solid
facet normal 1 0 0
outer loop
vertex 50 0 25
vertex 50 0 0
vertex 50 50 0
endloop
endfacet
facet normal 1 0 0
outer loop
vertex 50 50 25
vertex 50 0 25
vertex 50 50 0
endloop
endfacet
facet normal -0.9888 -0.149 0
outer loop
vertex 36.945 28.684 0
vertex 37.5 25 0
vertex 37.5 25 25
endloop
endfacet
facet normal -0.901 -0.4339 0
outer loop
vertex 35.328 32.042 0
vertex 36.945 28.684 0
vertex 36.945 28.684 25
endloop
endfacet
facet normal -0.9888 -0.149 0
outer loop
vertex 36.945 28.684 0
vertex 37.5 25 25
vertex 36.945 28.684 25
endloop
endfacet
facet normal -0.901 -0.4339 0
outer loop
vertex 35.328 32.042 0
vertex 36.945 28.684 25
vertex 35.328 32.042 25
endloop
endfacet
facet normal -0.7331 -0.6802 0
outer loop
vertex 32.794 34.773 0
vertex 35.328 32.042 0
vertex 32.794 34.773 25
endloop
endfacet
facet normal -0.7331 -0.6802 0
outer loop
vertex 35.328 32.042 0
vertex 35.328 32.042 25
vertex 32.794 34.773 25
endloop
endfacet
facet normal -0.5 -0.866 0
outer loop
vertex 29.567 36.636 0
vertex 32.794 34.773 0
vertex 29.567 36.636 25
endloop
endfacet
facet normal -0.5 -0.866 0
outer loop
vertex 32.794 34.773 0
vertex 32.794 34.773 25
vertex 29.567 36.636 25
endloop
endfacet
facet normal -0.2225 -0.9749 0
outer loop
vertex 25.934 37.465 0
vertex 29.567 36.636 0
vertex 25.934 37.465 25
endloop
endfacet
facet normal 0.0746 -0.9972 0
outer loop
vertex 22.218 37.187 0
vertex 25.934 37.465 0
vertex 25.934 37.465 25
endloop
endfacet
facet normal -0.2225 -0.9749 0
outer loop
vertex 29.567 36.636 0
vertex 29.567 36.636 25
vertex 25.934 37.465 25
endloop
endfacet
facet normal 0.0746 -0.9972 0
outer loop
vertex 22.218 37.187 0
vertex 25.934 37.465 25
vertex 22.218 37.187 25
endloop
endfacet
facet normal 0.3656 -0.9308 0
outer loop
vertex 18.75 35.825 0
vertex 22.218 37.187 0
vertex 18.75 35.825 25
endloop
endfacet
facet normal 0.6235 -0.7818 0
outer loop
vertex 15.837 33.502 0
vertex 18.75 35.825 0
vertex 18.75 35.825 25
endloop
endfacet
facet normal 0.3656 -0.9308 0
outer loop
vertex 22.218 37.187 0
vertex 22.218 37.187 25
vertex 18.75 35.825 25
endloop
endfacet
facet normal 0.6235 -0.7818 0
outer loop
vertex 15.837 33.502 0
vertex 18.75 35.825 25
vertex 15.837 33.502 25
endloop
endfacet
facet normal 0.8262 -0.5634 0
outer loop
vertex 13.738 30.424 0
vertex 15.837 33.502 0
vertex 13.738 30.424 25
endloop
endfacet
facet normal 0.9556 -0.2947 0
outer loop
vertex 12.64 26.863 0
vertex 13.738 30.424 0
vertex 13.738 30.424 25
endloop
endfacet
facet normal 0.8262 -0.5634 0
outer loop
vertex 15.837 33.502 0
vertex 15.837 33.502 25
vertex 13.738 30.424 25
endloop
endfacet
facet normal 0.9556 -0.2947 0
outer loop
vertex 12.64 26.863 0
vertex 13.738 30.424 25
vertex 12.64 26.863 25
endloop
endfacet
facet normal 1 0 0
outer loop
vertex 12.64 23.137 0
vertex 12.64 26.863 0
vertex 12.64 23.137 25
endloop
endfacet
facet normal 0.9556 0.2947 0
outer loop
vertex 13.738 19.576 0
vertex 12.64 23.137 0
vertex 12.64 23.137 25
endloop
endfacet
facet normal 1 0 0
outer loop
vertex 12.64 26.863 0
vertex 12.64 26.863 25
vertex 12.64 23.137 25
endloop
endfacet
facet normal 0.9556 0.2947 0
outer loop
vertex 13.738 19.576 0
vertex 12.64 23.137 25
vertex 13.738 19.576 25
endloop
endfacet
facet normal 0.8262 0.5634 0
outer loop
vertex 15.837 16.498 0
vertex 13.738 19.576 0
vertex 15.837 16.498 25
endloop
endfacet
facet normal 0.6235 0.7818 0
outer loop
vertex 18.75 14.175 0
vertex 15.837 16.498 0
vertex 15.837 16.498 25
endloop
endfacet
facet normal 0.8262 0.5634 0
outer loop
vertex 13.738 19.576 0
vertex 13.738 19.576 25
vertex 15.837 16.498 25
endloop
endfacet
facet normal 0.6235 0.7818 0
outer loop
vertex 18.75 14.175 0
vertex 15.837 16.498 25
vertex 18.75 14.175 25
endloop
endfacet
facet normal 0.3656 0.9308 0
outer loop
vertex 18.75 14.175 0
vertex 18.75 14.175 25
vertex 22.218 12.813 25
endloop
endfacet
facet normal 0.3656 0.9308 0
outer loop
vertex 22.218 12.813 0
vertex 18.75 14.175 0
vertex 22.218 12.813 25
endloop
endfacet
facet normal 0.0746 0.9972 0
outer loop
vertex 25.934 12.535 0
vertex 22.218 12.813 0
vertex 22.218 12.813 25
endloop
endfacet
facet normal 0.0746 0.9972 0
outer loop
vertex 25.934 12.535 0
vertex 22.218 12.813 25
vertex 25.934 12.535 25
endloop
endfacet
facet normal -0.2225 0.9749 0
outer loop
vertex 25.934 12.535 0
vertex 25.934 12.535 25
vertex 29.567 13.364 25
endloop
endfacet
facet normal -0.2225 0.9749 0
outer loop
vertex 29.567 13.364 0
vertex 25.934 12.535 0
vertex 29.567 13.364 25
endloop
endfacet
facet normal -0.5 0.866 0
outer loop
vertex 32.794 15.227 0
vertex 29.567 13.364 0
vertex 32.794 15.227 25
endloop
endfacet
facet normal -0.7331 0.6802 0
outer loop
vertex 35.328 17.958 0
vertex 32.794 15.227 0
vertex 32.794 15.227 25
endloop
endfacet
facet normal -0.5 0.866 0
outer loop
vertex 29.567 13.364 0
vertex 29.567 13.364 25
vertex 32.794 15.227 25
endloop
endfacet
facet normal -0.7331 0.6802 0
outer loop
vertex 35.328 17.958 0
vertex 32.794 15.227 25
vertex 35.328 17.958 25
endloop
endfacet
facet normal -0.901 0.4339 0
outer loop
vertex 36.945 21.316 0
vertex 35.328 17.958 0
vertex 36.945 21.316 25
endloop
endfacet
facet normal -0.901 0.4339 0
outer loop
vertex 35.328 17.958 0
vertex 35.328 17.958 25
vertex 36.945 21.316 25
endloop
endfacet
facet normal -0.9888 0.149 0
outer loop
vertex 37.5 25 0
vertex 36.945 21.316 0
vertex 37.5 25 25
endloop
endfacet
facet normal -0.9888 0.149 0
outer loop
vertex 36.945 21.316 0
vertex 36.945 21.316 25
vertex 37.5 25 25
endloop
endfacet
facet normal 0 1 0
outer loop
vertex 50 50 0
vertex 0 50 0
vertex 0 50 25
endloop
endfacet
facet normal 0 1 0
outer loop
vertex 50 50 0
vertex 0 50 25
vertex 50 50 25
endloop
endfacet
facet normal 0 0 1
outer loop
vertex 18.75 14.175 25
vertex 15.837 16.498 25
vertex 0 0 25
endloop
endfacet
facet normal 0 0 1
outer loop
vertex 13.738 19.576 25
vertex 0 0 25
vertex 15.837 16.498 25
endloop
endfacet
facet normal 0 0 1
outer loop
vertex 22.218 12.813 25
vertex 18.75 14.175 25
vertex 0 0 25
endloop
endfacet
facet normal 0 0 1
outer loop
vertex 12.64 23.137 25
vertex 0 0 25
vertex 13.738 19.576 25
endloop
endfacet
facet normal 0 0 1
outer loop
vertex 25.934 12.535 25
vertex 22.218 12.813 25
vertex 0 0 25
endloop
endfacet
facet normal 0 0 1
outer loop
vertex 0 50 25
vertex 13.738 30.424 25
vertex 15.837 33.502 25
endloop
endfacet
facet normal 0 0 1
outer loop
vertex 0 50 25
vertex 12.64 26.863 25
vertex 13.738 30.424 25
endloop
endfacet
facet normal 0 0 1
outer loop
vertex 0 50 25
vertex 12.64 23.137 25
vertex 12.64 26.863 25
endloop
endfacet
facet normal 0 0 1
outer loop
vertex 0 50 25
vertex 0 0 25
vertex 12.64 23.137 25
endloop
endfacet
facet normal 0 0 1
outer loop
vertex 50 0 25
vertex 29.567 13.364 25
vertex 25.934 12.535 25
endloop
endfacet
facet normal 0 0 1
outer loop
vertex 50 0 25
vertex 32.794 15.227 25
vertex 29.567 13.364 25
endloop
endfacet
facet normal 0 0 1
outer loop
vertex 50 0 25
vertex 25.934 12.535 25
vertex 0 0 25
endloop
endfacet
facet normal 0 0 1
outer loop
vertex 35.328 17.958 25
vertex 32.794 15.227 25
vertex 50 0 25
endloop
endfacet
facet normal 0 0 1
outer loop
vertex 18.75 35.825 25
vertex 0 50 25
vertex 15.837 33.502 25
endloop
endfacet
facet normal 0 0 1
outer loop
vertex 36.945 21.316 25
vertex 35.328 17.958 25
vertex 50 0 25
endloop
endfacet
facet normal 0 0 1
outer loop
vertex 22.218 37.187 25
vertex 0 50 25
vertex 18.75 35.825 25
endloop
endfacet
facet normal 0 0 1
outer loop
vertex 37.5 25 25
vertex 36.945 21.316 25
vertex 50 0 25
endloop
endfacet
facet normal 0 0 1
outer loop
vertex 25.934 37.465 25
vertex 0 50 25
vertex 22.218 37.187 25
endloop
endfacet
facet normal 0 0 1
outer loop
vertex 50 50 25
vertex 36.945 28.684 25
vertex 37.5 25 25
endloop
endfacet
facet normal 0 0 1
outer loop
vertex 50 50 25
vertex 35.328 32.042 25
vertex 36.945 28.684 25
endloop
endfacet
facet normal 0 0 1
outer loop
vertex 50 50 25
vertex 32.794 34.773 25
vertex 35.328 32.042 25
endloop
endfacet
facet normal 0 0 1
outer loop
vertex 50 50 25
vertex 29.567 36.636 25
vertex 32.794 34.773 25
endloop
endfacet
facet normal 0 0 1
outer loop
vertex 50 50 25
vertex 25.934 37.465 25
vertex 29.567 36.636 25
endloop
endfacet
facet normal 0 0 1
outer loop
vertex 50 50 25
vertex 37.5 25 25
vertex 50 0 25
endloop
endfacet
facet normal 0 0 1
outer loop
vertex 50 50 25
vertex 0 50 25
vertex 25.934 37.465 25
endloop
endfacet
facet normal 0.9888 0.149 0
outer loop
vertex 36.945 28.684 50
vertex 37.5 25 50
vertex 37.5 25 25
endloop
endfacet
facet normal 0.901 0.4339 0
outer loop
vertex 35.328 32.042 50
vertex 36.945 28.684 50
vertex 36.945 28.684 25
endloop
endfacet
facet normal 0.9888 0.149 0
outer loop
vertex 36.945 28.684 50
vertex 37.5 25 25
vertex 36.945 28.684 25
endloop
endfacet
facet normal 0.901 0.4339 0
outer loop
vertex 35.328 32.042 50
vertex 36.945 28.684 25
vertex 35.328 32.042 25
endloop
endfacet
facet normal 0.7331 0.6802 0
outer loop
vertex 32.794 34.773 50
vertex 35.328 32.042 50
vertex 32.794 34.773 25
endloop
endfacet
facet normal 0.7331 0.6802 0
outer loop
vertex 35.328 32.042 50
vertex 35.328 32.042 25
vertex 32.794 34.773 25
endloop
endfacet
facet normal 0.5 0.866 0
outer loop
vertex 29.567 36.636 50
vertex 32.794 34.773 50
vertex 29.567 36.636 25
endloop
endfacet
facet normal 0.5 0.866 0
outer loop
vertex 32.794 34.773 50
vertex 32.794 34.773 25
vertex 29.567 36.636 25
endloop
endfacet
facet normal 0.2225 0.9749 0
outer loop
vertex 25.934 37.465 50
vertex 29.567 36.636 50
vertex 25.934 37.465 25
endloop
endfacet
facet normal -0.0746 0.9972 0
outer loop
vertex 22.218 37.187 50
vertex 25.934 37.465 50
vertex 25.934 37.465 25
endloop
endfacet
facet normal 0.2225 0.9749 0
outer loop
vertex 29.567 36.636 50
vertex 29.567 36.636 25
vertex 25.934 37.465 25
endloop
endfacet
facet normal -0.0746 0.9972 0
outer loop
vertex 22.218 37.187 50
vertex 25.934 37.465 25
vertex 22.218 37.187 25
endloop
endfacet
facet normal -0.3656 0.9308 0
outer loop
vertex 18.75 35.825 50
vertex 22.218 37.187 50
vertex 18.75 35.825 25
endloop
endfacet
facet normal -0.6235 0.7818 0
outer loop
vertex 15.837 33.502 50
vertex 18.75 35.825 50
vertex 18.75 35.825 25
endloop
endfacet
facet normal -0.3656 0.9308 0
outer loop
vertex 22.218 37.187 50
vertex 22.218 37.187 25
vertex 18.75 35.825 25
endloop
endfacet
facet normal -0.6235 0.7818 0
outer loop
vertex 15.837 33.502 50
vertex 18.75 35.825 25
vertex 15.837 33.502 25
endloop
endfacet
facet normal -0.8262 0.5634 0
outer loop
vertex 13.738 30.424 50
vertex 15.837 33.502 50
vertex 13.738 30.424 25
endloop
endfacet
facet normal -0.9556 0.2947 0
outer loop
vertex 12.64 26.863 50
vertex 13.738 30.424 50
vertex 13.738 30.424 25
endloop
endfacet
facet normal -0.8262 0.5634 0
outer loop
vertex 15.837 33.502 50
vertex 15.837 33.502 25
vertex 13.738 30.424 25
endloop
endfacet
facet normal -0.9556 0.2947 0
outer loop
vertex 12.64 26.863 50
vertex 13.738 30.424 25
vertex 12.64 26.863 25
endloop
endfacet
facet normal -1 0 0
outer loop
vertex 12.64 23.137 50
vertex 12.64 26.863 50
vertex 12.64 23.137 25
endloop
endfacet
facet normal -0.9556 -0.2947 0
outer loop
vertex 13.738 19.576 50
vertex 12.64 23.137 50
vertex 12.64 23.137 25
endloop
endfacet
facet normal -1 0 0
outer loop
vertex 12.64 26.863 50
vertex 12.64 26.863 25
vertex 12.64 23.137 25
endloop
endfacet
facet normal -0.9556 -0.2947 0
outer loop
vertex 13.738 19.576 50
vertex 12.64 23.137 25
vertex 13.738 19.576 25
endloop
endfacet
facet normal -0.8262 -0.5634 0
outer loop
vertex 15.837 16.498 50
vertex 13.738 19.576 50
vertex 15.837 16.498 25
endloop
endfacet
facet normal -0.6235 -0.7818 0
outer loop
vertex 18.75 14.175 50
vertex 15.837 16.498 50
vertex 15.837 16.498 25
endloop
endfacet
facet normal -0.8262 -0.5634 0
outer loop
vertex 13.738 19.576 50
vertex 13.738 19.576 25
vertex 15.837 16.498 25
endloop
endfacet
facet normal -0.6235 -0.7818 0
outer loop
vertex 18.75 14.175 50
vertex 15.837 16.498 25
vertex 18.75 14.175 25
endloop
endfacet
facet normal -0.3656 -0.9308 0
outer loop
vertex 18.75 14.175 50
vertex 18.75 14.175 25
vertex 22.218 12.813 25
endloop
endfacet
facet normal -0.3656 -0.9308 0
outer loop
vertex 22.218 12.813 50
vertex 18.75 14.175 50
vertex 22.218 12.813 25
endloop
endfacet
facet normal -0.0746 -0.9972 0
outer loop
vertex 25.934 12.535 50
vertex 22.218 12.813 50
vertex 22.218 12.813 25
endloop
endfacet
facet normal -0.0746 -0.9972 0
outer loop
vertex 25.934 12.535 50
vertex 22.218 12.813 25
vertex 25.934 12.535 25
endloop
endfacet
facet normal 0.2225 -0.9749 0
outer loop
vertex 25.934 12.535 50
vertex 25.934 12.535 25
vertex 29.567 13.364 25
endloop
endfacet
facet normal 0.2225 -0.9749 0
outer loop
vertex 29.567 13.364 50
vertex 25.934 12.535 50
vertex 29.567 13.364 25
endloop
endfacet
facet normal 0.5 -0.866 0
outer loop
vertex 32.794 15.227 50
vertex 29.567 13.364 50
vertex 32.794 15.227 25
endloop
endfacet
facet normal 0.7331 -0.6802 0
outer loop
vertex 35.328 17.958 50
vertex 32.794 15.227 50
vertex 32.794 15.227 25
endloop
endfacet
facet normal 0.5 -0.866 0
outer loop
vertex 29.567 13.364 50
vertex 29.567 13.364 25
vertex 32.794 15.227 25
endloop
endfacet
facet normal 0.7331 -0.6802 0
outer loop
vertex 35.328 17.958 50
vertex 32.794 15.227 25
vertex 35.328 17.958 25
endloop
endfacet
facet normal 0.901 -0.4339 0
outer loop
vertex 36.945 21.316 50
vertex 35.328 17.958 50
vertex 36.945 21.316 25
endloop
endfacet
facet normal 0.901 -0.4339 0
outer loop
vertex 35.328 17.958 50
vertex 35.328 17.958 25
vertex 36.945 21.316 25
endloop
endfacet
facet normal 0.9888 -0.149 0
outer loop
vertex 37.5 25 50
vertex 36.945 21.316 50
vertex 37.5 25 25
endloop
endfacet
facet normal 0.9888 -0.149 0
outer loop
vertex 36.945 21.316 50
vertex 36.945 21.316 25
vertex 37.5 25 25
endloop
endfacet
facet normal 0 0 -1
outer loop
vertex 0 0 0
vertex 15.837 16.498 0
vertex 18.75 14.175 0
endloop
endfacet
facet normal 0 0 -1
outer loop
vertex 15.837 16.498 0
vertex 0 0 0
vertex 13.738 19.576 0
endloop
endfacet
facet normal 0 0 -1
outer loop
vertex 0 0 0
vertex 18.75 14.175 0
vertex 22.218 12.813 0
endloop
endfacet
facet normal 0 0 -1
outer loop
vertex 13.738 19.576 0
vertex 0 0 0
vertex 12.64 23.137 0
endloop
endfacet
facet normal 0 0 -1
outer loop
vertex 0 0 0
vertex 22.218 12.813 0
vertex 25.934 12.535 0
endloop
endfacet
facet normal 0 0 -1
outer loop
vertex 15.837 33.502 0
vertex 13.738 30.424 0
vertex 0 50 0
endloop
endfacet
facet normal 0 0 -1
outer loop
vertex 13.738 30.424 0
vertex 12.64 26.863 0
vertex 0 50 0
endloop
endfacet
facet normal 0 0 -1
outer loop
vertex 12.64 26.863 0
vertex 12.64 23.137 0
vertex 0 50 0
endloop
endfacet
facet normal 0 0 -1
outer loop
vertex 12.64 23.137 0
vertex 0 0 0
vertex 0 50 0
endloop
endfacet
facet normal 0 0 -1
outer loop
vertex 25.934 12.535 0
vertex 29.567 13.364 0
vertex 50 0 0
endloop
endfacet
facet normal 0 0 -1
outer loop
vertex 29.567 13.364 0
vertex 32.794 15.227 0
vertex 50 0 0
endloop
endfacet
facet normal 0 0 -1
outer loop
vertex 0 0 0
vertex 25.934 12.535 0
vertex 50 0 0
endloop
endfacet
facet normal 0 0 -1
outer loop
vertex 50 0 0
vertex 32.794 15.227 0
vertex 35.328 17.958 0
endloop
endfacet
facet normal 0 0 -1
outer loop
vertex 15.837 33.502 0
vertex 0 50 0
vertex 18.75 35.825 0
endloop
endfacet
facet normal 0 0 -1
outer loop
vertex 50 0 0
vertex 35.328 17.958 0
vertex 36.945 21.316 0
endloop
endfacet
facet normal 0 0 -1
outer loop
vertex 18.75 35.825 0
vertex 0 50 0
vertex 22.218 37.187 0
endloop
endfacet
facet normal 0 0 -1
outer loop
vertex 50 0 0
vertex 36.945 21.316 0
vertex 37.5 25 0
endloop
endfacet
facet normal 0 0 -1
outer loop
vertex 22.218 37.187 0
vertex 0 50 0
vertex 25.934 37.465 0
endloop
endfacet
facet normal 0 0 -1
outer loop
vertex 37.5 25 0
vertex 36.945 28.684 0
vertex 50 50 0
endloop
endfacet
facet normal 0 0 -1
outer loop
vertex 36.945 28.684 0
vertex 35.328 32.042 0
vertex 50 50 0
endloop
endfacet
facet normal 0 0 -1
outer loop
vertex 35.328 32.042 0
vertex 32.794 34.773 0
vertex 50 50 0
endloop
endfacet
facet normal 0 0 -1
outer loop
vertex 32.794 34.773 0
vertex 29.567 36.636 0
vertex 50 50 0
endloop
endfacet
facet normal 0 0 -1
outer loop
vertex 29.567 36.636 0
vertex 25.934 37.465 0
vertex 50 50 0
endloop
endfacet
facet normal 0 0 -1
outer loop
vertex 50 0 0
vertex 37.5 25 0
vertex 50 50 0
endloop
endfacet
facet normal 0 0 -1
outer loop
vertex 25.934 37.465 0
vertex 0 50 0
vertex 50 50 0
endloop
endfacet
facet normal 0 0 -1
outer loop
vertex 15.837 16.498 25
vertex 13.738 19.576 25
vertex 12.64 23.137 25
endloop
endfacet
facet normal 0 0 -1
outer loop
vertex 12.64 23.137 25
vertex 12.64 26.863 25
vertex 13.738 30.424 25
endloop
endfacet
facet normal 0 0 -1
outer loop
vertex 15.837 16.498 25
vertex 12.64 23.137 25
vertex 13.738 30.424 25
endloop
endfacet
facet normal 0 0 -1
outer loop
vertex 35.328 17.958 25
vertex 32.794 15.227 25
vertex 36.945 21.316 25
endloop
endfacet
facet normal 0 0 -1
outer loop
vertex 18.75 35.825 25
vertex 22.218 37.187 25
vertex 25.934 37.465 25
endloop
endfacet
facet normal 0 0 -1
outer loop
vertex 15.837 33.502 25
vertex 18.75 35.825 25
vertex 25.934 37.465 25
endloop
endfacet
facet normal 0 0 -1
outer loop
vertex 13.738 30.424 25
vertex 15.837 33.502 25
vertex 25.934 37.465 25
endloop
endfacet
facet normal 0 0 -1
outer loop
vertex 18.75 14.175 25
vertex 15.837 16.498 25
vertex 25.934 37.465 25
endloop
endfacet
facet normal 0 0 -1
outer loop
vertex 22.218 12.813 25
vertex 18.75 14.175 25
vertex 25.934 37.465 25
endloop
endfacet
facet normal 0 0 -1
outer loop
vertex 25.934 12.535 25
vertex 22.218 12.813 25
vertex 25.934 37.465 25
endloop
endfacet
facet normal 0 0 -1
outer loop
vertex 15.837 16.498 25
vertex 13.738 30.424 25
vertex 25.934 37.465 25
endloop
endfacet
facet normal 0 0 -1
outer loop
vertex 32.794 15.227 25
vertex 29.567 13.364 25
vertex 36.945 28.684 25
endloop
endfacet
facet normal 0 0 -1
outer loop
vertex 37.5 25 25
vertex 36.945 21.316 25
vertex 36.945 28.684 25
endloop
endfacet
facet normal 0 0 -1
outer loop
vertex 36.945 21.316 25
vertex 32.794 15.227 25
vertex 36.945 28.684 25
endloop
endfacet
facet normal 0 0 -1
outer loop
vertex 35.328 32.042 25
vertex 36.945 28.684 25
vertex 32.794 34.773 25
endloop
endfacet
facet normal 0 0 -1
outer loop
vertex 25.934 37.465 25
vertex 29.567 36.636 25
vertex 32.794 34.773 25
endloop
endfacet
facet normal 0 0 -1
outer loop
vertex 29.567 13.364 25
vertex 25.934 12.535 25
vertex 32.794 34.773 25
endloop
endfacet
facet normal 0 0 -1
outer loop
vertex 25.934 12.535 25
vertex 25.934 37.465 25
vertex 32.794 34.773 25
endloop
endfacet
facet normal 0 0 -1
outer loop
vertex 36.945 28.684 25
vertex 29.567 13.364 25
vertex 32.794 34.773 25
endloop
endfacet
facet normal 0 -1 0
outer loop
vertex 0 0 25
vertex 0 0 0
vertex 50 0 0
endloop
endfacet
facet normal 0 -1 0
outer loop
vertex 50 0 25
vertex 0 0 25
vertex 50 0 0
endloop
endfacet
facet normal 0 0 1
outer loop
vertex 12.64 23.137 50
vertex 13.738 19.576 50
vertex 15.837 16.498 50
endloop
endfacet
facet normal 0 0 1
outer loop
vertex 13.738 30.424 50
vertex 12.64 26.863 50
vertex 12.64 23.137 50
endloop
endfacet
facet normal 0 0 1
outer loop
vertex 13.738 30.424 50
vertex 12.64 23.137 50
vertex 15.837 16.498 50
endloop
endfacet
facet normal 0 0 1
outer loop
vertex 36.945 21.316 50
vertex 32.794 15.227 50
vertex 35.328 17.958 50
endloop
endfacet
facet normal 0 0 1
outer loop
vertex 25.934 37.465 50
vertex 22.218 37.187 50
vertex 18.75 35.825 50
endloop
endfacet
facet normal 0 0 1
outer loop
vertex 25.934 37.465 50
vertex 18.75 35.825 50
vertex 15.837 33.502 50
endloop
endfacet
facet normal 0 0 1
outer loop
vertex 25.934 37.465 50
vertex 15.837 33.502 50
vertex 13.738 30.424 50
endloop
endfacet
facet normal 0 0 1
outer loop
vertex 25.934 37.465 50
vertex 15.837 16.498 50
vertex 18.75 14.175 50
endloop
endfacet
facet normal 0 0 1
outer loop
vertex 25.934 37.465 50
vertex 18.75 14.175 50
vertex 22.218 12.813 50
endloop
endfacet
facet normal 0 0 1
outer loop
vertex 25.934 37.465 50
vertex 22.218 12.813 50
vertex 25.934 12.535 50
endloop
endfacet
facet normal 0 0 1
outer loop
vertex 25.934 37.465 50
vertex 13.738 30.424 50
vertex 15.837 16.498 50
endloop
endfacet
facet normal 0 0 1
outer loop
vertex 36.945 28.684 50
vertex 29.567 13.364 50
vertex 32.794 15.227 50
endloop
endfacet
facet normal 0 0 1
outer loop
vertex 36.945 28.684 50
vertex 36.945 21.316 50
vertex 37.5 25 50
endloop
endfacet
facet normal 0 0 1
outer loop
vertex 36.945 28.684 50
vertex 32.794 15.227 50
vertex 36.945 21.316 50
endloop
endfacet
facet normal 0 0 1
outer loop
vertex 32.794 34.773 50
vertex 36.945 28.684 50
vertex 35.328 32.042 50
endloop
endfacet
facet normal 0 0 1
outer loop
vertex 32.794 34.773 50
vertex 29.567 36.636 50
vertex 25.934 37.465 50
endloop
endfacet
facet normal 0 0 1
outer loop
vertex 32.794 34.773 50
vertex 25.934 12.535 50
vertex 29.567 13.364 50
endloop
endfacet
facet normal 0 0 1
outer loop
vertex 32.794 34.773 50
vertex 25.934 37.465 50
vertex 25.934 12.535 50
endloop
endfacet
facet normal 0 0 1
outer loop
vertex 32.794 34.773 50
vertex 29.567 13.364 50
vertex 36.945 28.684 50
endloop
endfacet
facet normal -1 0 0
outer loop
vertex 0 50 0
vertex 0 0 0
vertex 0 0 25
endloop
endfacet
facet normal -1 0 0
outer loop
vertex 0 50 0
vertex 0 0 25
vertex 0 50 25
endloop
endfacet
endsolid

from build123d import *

# Parameters (mm, degrees)
F0_W     = 50
F0_H     = 50
F1_DEPTH = 25
F2_R     = 12.5
F3_DEPTH = 25
F4_R     = 12.5
F5_DEPTH = 25


with BuildPart() as f1:
    # F0 (on Top) → F1 (new body)
    with BuildSketch(Plane.XY):
        with Locations((25, 25)):
            Rectangle(F0_W, F0_H)
    extrude(amount=F1_DEPTH)

    # F2 (on face) → F3 (cut)
    with BuildSketch(Plane.XY.offset(25)):
        with Locations((25, 25)):
            Circle(F2_R)
    extrude(amount=-F3_DEPTH, mode=Mode.SUBTRACT)


with BuildPart() as f5:
    # F4 (on face) → F5 (new body)
    with BuildSketch(Plane.XY.offset(25)):
        with Locations((25, 25)):
            Circle(F4_R)
    extrude(amount=F5_DEPTH)


solid = Compound([f1.part, f5.part])
